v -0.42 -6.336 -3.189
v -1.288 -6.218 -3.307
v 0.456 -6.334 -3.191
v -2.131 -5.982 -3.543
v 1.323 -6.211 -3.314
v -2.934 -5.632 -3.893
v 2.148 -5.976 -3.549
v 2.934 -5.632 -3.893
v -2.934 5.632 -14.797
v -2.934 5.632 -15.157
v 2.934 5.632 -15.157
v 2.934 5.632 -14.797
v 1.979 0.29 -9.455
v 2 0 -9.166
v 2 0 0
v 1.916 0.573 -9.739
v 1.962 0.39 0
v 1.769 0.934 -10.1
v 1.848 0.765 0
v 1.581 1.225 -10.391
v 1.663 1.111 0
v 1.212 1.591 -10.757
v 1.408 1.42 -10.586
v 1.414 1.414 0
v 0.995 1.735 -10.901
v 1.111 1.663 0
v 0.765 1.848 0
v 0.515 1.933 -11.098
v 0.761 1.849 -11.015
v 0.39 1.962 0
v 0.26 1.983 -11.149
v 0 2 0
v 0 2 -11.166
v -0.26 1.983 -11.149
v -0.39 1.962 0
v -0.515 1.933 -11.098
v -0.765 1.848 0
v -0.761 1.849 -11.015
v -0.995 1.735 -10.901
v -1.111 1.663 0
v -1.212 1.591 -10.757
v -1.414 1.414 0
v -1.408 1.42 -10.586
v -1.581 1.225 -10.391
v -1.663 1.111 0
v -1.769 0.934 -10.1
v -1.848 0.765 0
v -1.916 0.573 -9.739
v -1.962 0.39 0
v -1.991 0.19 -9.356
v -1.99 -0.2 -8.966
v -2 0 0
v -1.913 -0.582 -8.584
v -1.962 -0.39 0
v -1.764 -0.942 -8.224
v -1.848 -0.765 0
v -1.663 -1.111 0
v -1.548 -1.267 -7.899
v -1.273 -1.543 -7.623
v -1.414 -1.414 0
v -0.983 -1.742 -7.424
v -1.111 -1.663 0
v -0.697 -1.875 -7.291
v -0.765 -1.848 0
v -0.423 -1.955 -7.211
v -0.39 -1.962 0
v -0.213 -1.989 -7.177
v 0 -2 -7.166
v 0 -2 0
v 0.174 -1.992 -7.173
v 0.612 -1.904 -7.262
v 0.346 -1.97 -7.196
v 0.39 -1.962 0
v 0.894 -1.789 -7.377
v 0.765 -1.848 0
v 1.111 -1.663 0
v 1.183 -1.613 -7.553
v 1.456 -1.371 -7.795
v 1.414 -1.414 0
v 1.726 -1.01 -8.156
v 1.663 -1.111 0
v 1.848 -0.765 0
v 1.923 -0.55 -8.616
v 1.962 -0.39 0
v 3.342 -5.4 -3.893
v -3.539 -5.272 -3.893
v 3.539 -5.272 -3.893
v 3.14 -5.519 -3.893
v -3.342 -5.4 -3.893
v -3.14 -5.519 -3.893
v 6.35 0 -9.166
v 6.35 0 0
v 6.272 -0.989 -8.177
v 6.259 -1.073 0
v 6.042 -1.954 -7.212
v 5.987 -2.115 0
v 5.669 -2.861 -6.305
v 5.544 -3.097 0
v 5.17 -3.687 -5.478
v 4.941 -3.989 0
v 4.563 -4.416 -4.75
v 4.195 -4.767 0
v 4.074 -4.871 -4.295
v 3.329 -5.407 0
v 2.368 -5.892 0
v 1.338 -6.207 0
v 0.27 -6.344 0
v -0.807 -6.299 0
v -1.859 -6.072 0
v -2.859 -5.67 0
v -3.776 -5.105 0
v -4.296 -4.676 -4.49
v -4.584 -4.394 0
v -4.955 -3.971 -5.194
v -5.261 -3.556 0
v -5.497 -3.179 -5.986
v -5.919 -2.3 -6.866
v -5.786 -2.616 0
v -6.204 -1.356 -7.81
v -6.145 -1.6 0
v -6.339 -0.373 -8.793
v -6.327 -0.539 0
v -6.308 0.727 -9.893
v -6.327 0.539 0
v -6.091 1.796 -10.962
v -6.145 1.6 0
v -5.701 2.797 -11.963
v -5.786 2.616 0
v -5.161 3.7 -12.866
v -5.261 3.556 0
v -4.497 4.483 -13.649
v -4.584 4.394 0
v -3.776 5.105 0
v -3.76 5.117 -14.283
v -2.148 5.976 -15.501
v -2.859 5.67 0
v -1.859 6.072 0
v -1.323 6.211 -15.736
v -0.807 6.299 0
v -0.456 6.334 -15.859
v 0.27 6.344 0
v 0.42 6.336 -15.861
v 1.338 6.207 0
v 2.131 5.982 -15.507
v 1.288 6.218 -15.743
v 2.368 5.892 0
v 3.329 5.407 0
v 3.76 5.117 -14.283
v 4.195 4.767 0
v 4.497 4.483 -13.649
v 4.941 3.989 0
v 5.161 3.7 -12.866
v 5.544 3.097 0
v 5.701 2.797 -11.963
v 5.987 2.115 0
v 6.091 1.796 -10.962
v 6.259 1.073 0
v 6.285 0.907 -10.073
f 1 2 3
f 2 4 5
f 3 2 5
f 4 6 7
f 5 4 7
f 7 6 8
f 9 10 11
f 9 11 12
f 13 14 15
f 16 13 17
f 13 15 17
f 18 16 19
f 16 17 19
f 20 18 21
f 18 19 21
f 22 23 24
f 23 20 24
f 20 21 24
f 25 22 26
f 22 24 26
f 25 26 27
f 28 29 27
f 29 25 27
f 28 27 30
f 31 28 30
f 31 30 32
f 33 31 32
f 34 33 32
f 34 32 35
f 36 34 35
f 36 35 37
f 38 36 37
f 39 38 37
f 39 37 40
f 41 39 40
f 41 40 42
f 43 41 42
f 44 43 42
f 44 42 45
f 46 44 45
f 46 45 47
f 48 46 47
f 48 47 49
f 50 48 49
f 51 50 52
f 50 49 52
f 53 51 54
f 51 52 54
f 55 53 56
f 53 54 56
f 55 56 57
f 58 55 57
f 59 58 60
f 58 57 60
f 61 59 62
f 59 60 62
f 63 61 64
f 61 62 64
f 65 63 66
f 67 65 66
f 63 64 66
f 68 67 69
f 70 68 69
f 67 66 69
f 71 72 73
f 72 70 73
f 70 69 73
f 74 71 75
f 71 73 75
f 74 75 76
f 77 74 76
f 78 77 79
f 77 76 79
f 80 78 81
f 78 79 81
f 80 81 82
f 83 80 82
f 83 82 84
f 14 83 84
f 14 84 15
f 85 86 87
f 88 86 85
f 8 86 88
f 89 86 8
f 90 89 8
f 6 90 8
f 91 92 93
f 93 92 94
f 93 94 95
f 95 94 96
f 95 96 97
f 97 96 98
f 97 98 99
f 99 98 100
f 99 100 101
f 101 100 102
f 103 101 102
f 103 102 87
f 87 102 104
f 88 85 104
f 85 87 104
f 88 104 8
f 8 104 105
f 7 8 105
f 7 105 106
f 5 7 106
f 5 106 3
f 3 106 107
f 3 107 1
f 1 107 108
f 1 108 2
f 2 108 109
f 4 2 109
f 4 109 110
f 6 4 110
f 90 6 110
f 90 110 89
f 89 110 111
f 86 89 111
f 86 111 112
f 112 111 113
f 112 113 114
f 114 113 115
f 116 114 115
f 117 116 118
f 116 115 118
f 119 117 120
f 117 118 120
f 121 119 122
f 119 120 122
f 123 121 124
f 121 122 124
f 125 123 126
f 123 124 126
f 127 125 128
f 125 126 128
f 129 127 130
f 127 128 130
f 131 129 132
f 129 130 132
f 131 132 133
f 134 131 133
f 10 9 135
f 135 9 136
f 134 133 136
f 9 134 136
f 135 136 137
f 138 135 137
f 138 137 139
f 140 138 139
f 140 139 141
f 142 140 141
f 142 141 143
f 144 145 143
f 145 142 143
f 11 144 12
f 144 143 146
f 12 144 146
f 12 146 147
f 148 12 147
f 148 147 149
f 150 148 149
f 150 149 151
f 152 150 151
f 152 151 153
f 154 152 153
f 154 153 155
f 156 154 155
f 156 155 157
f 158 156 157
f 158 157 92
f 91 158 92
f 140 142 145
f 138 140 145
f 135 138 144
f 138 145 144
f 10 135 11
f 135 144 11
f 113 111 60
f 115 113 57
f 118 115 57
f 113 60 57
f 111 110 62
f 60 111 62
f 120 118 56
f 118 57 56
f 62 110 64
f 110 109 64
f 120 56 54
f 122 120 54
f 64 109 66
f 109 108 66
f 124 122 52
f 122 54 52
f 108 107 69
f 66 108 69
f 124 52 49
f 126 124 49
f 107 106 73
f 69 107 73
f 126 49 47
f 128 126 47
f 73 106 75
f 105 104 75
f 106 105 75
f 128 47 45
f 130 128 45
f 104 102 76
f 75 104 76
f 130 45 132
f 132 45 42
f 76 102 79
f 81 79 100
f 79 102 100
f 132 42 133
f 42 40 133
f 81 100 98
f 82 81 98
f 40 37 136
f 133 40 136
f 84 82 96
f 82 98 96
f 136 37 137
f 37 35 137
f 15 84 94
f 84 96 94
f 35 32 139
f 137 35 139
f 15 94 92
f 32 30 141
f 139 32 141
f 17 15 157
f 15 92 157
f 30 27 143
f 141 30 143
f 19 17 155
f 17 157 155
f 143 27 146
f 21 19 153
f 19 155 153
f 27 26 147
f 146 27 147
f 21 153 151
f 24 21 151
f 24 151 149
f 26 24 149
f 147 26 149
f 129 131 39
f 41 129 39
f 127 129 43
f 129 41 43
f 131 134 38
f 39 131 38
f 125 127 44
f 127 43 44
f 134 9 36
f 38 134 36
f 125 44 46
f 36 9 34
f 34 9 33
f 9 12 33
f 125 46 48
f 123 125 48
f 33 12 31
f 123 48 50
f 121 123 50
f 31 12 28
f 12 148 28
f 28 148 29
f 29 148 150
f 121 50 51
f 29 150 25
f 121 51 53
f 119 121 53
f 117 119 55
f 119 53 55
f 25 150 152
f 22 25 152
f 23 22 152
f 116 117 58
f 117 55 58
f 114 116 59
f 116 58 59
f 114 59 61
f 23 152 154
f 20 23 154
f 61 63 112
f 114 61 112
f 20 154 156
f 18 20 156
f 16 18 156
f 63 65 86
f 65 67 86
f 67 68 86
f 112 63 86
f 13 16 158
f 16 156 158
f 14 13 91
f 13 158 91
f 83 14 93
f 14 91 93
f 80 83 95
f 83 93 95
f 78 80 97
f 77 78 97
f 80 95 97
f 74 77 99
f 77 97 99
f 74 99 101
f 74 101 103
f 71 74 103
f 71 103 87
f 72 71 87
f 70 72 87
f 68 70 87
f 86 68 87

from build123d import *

# Parameters (mm, degrees)
BOSS_EXTRUDE1_DEPTH     = 9.525
SKETCH2_OUTSIDE_W       = 27.65
SKETCH2_OUTSIDE_H       = 27.65
SKETCH2_OUTSIDE_R       = 6.35
CUT_EXTRUDE1_DEPTH      = 20.05
CUT_EXTRUDE1_DEPTH_BACK = 1
SKETCH3_R               = 2
CUT_EXTRUDE2_DEPTH      = 16.875
CUT_EXTRUDE6_DEPTH      = 7.35
CUT_EXTRUDE6_DEPTH_BACK = 7.35


with BuildPart() as part:
    # Sketch1 → Boss-Extrude1 (new body, symmetric)
    with BuildSketch(Plane(origin=(0, 0, 0), x_dir=(0, 0, -1), z_dir=(1, 0, 0))):
        Polygon((19.05, 9.525), (0, -9.525), (0, 9.525), align=None)
    extrude(amount=BOSS_EXTRUDE1_DEPTH, both=True)

    # Sketch2 outside → Cut-Extrude1 (cut, two sides)
    with BuildSketch(Plane(origin=(0, -2.789807909, 0), x_dir=(1, 0, 0), z_dir=(0, 0, -1))) as cut_extrude1_sk:
        with Locations((0, -2.79)):
            Rectangle(SKETCH2_OUTSIDE_W, SKETCH2_OUTSIDE_H)
        with Locations((0, -2.789807909)):
            Circle(SKETCH2_OUTSIDE_R, mode=Mode.SUBTRACT)
    extrude(amount=CUT_EXTRUDE1_DEPTH, mode=Mode.SUBTRACT)
    extrude(cut_extrude1_sk.sketch, amount=-CUT_EXTRUDE1_DEPTH_BACK, mode=Mode.SUBTRACT)

    # Sketch3 → Cut-Extrude2 (cut, through all)
    with BuildSketch(Plane.XY):
        Circle(SKETCH3_R)
    extrude(amount=-CUT_EXTRUDE2_DEPTH, mode=Mode.SUBTRACT)

    # Sketch11 → Cut-Extrude6 (cut, two sides)
    with BuildSketch(Plane(origin=(0, 0, 0), x_dir=(0, 0, -1), z_dir=(1, 0, 0))) as cut_extrude6_sk:
        Polygon((15.15657951, 5.63157951), (14.797369265, 5.63157951), (3.89342049, -5.272369265), (3.89342049, -5.63157951), align=None)
    extrude(amount=CUT_EXTRUDE6_DEPTH, mode=Mode.SUBTRACT)
    extrude(cut_extrude6_sk.sketch, amount=-CUT_EXTRUDE6_DEPTH_BACK, mode=Mode.SUBTRACT)


solid = part.part
